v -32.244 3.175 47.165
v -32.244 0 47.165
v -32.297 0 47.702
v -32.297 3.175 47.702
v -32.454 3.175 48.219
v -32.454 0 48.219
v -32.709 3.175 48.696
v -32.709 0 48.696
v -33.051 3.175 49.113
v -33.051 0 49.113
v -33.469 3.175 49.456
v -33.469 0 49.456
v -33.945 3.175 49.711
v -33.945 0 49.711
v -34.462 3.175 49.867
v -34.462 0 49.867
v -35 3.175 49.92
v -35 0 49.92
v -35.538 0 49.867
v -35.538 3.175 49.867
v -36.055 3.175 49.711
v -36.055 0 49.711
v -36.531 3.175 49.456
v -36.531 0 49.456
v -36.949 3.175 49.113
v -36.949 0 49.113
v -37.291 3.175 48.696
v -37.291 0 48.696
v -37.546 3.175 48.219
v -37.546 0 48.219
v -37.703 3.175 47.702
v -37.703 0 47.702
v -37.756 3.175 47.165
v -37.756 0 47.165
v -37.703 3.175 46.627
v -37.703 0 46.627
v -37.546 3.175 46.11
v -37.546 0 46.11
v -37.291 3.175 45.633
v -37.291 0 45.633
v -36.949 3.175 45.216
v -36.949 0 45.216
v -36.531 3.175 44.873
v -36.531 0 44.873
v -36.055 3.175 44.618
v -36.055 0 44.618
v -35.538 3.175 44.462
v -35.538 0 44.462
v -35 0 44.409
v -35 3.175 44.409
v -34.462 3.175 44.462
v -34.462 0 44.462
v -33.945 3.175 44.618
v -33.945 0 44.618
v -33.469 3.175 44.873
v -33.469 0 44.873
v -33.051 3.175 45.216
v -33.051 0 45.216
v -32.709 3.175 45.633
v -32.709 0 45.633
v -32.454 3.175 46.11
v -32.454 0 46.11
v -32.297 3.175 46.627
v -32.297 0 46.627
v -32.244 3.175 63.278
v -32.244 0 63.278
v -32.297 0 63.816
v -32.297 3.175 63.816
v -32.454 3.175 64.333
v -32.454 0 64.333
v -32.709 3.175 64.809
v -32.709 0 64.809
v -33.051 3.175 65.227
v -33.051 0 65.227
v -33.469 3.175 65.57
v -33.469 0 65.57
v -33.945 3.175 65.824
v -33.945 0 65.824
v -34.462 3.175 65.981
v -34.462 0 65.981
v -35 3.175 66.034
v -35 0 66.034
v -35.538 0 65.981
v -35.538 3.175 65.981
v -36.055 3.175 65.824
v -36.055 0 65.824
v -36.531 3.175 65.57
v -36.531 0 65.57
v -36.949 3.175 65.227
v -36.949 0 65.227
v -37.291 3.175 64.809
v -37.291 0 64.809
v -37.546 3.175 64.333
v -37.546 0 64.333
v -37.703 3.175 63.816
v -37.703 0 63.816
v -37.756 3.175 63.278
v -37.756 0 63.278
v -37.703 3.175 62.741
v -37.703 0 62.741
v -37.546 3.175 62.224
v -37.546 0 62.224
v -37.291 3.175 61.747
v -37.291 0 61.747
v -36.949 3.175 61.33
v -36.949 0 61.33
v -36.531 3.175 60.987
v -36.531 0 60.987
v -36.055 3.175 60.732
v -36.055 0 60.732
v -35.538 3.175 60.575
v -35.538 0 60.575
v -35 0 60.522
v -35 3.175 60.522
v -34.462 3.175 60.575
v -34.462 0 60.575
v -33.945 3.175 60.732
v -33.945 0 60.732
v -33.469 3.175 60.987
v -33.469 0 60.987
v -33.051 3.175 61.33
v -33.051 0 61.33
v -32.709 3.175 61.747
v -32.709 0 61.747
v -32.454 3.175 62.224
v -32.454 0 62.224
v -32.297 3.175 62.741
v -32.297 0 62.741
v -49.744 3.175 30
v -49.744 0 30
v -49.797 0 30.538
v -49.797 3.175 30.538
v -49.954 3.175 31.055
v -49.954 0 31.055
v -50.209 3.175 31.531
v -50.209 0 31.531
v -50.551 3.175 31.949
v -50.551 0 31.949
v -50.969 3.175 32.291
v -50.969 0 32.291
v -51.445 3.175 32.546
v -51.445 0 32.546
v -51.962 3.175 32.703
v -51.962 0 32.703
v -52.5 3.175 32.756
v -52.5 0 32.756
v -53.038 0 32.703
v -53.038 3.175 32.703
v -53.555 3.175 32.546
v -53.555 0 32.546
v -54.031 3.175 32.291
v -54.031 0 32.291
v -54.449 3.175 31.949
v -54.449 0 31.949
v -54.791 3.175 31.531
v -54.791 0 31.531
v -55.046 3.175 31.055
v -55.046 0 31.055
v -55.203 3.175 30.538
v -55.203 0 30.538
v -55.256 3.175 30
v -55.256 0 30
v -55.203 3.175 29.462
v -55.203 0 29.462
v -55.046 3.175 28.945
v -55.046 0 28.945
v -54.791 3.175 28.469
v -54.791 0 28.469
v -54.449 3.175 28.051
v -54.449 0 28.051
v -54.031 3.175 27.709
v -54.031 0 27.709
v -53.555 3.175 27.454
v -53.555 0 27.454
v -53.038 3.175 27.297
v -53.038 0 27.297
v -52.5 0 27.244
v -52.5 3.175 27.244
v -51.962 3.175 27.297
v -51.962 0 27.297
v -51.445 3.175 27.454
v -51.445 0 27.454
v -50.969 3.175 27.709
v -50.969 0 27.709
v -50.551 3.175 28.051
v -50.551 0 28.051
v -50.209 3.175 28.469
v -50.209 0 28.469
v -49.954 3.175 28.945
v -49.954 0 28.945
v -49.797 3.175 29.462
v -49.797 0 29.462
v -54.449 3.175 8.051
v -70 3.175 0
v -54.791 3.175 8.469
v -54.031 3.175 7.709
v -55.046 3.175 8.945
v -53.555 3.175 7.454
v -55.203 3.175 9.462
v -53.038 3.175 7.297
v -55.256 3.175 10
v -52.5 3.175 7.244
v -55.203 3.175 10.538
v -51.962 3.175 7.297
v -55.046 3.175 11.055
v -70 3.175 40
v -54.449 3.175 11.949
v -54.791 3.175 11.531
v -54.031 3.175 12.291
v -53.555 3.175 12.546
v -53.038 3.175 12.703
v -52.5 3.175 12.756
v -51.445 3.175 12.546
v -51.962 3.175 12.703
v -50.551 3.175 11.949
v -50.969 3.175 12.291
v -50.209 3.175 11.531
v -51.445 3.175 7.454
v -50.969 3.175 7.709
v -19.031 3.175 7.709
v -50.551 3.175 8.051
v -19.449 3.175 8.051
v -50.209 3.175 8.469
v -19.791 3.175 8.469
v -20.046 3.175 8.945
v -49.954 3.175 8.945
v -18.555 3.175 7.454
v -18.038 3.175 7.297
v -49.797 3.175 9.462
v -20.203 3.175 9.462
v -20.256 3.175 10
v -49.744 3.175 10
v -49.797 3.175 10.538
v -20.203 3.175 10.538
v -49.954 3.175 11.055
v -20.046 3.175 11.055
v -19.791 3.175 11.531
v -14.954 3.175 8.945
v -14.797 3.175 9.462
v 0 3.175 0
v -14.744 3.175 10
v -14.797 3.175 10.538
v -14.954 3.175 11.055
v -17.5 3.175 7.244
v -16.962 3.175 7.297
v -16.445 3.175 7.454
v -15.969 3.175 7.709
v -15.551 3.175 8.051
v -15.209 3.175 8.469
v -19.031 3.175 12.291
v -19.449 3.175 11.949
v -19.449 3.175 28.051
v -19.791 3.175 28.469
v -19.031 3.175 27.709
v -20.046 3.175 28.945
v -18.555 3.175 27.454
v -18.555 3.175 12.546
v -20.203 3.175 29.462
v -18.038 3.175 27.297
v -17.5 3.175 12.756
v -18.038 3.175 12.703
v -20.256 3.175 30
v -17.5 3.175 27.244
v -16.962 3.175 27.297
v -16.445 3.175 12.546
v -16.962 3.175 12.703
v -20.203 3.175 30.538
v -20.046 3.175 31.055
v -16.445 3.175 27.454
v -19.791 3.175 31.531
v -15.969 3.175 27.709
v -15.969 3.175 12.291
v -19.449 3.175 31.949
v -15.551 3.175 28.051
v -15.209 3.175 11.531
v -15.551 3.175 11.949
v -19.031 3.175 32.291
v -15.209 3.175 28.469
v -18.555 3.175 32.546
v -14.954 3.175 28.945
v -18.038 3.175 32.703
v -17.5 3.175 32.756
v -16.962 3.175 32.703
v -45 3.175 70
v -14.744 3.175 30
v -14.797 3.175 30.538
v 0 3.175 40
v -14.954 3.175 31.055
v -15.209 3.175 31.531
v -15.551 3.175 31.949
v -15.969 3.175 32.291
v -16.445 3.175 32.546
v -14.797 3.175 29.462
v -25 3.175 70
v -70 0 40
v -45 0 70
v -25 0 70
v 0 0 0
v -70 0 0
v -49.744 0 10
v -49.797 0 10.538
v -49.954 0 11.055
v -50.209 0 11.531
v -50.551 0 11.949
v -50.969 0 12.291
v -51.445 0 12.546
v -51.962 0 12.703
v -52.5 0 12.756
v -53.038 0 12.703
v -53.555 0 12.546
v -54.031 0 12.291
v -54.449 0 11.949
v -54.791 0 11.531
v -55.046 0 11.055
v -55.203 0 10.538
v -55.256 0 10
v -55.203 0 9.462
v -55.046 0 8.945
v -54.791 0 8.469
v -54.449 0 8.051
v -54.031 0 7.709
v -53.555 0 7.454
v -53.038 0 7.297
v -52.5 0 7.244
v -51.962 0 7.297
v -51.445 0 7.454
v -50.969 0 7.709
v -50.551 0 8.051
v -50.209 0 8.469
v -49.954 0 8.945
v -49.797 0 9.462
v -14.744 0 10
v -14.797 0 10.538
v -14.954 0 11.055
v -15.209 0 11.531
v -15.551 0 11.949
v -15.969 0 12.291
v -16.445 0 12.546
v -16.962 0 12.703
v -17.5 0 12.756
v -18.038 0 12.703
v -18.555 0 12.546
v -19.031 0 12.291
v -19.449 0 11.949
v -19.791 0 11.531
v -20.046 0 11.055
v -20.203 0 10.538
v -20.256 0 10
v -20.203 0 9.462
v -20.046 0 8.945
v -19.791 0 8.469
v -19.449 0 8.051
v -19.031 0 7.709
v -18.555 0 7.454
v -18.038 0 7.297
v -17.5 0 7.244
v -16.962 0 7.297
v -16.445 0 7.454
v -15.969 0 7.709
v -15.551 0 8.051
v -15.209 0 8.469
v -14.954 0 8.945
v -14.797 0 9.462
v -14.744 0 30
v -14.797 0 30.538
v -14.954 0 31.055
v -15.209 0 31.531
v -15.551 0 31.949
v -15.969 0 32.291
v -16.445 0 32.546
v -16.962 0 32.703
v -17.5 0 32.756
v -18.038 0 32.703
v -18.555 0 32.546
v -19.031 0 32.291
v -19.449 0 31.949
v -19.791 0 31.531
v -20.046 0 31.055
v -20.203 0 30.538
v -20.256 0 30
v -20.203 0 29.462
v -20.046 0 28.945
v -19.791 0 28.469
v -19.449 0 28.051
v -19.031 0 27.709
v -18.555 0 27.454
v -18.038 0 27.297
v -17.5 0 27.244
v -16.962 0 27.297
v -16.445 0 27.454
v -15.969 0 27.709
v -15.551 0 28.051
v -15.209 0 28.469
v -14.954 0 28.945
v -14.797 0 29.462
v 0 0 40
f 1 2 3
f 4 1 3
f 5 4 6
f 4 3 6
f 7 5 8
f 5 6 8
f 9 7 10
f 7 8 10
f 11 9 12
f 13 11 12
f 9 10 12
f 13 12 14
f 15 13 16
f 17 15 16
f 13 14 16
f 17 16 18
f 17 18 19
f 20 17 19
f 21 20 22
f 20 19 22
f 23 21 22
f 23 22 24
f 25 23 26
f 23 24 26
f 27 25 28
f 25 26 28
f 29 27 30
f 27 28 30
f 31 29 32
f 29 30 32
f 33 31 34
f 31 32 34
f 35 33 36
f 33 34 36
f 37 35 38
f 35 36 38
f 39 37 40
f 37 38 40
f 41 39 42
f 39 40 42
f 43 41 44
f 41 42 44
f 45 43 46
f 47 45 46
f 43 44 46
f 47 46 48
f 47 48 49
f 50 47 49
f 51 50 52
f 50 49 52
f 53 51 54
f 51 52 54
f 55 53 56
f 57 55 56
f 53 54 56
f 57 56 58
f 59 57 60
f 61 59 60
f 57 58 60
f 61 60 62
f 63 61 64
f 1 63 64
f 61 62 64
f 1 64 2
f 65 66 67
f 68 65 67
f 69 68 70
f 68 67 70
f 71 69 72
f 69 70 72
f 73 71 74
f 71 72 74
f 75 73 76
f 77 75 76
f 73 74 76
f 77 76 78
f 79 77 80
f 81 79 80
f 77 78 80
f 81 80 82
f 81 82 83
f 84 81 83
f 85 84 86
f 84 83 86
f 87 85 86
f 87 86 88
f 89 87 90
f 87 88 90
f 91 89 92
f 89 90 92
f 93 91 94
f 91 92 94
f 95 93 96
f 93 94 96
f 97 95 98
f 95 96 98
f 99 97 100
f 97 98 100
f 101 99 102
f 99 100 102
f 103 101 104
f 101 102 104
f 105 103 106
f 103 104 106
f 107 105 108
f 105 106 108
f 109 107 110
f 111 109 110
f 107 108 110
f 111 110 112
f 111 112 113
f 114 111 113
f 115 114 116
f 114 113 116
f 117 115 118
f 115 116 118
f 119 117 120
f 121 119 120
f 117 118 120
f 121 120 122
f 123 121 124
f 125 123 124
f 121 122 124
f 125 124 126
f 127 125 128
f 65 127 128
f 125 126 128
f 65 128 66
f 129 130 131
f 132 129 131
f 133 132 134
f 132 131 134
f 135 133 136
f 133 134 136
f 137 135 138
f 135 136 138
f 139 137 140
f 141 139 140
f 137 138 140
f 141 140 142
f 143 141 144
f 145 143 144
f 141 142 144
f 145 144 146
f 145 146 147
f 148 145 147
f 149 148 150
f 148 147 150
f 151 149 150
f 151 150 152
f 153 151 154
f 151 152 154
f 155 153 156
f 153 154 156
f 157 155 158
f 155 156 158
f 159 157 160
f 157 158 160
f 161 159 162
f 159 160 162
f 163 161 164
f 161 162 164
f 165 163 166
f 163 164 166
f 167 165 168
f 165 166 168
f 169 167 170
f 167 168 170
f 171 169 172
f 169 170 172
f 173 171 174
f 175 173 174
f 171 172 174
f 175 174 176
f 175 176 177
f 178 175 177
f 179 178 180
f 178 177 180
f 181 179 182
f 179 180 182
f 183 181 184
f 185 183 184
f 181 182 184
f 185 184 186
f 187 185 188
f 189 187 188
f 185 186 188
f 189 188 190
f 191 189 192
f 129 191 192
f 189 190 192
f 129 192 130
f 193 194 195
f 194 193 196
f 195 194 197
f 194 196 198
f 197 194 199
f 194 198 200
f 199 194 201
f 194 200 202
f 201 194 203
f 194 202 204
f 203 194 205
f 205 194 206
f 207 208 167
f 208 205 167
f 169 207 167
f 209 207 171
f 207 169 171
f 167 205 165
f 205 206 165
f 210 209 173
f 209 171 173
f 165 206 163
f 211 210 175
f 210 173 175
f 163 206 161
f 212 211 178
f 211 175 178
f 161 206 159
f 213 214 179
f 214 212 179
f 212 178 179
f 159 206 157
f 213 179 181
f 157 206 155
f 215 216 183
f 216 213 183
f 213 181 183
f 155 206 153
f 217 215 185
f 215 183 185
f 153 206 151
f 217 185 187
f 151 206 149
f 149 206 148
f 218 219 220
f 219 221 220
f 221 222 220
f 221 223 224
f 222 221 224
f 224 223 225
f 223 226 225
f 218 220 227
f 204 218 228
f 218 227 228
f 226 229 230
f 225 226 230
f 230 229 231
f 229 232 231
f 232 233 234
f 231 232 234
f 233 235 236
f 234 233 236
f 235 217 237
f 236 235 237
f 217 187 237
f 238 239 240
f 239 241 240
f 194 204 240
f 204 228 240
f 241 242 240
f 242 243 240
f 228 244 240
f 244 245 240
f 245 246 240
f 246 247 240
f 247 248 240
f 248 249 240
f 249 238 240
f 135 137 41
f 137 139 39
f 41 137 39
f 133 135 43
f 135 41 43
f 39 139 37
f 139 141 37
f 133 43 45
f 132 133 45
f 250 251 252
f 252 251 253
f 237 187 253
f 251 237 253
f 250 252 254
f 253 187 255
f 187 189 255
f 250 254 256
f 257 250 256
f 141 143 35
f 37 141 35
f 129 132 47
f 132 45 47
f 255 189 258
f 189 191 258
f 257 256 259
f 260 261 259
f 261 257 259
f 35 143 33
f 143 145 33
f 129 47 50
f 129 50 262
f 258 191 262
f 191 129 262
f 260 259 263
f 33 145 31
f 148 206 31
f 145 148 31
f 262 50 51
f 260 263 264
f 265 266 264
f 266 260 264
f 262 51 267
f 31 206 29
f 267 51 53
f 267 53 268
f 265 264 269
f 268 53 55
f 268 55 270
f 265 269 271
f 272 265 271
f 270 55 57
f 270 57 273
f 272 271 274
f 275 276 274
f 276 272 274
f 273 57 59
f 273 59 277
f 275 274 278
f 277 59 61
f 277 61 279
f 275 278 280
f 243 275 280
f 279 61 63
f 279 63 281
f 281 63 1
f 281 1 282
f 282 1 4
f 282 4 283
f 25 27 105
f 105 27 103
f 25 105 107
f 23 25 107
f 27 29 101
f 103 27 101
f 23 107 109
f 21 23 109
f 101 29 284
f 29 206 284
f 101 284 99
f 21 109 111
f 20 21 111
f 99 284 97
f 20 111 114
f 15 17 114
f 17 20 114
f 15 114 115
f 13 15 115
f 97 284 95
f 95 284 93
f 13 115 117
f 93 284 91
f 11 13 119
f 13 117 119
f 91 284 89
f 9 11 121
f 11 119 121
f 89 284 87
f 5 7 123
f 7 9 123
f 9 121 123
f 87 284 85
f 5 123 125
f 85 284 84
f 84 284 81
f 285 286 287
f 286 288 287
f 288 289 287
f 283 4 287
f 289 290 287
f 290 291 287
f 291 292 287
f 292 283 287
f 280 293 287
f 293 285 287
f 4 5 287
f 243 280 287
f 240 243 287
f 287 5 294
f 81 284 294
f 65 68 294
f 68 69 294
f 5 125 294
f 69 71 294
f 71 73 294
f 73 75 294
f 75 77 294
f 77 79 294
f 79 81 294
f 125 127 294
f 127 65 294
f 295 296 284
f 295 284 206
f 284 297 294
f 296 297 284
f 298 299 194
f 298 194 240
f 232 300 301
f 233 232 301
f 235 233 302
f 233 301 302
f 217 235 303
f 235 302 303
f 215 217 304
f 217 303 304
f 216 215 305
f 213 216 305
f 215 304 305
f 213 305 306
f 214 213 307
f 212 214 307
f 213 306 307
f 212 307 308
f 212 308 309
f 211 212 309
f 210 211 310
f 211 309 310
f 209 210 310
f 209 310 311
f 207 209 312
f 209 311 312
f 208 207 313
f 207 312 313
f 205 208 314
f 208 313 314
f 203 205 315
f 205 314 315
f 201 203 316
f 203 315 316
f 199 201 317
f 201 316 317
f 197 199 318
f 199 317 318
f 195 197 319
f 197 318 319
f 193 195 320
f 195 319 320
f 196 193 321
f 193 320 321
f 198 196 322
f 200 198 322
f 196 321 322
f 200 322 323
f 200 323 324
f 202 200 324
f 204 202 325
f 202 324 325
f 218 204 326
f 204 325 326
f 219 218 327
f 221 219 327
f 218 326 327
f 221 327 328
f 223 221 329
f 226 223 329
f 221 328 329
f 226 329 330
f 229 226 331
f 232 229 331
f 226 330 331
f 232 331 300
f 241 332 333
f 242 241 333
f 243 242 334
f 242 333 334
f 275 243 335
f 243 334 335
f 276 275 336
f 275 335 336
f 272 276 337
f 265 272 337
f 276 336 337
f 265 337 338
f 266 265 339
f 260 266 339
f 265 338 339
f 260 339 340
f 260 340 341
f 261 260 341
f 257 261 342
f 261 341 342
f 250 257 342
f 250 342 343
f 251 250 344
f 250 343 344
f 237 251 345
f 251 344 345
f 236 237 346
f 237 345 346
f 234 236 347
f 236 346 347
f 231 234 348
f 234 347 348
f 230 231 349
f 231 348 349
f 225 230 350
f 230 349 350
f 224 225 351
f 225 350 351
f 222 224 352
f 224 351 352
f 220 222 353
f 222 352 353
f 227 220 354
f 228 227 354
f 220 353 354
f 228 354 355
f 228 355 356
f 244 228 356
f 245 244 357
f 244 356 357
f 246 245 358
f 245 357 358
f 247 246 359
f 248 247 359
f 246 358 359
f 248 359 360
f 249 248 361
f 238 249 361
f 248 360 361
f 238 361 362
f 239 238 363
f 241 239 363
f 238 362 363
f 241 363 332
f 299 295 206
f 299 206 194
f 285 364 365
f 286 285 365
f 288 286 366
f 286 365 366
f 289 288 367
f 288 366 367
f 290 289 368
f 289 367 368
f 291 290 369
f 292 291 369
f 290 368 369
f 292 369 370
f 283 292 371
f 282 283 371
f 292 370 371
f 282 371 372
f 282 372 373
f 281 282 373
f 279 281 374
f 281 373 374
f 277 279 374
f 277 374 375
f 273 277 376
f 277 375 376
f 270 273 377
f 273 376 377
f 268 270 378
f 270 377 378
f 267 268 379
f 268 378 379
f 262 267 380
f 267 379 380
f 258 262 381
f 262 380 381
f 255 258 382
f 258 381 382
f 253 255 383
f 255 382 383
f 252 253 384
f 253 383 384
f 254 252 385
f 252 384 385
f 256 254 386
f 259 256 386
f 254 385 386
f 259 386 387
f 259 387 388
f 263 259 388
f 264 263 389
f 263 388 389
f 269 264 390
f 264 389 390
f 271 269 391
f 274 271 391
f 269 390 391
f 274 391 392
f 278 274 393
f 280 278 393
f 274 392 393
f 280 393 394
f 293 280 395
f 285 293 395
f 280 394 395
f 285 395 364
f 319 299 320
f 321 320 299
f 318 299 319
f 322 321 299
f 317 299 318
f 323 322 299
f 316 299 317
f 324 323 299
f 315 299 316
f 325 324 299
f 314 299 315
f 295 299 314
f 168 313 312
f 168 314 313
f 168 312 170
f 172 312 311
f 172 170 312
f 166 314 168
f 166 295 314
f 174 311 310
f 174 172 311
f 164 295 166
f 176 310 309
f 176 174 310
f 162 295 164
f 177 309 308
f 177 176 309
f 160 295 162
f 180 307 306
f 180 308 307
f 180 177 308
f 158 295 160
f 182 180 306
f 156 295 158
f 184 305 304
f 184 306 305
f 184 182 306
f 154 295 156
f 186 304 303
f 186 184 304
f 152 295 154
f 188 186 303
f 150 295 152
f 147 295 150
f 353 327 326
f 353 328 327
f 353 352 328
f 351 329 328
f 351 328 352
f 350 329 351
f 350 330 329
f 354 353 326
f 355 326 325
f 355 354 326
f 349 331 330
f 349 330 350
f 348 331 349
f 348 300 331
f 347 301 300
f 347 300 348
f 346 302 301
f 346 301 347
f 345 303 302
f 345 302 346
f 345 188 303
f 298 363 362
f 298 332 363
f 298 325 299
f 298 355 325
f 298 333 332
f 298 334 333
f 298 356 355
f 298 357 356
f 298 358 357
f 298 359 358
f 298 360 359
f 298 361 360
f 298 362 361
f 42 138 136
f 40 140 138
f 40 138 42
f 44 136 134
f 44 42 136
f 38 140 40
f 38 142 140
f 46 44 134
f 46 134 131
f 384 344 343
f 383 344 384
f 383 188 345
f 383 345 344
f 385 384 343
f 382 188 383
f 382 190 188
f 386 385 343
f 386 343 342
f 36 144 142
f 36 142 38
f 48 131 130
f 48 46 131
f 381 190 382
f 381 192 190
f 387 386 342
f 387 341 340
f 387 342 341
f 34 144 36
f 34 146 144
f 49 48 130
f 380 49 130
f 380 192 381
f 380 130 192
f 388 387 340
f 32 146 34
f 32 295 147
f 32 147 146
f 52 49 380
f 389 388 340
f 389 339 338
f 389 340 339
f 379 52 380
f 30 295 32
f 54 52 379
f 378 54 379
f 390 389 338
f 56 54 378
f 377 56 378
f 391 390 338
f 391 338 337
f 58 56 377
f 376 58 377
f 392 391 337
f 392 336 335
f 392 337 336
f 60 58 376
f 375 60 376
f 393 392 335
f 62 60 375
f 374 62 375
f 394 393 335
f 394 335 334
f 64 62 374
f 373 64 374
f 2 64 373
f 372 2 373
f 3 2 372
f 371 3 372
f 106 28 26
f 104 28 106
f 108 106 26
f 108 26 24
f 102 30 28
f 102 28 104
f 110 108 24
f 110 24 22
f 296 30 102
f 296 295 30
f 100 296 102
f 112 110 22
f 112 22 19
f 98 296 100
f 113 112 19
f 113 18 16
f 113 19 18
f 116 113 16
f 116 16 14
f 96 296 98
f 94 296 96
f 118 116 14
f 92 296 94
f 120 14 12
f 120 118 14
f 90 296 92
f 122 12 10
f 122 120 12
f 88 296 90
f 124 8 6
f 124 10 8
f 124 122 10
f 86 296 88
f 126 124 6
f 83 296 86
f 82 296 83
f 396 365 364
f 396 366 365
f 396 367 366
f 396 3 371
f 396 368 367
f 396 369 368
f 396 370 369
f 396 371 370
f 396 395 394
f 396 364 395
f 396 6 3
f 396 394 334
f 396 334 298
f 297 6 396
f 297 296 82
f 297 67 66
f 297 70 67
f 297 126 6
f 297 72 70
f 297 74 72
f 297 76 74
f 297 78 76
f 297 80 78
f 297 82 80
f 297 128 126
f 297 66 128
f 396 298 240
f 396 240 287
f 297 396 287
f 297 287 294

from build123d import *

# Parameters (mm, degrees)
F0_R     = 2.7559
F1_DEPTH = 3.175


with BuildPart() as f1:
    # F0 (on Front) → F1 (new body)
    with BuildSketch(Plane.XZ):
        Polygon((-70, 0), (0, 0), (0, 40), (-25, 70), (-45, 70), (-70, 40), align=None)
        with Locations((-52.5, 10.000005)):
            Circle(F0_R, mode=Mode.SUBTRACT)
        with Locations((-52.5, 30.000005)):
            Circle(F0_R, mode=Mode.SUBTRACT)
        with Locations((-17.5, 10.000005)):
            Circle(F0_R, mode=Mode.SUBTRACT)
        with Locations((-17.5, 30.000005)):
            Circle(F0_R, mode=Mode.SUBTRACT)
        with Locations((-35, 47.164548)):
            Circle(F0_R, mode=Mode.SUBTRACT)
        with Locations((-35, 63.27837)):
            Circle(F0_R, mode=Mode.SUBTRACT)
    extrude(amount=-F1_DEPTH)


solid = f1.part
